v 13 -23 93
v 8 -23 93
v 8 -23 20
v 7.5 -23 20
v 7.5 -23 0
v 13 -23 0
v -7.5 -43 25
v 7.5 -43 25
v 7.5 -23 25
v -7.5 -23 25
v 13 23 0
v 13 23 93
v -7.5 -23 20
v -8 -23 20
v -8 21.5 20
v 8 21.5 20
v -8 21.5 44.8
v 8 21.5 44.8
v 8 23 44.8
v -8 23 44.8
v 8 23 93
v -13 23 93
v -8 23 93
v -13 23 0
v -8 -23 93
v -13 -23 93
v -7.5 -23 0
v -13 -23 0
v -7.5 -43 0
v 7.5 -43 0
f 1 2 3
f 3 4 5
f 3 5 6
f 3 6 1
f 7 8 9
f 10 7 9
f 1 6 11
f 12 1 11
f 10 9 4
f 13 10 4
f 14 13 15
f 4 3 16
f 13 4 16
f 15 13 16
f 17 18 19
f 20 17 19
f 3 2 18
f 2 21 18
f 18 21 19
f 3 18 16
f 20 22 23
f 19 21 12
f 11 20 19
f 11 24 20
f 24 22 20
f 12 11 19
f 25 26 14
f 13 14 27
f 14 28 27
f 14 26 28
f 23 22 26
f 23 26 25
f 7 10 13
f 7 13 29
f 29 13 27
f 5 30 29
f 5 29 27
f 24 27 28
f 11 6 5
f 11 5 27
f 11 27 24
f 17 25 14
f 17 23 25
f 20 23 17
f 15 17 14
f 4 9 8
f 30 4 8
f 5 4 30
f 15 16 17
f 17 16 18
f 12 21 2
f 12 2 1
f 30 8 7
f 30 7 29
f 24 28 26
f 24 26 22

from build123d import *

# Parameters (mm, degrees)
SKETCH_2_W          = 26
SKETCH_2_H          = 46
EXTRUDE_1_DEPTH     = 93
CUT_EXTRUDE_1_DEPTH = 8
SKETCH_7_W          = 25
SKETCH_7_H          = 20
EXTRUDE_2_DEPTH     = 7.5


with BuildPart() as part:
    # 스케치2 → 보스-돌출1 (new body)
    with BuildSketch(Plane.XY):
        Rectangle(SKETCH_2_W, SKETCH_2_H)
    extrude(amount=EXTRUDE_1_DEPTH)

    # 스케치3 → 컷-돌출1 (cut, symmetric)
    with BuildSketch(Plane(origin=(0, 0, 0), x_dir=(0, 0, -1), z_dir=(1, 0, 0))):
        Polygon((-93, -23), (-20, -23), (-20, 21.5), (-44.8, 21.5), (-44.8, 23), (-93, 23), align=None)
    extrude(amount=CUT_EXTRUDE_1_DEPTH, both=True, mode=Mode.SUBTRACT)

    # 스케치7 → 보스-돌출2 (add, symmetric)
    with BuildSketch(Plane(origin=(0, 0, 0), x_dir=(0, 0, -1), z_dir=(1, 0, 0))):
        with Locations((-12.5, -33)):
            Rectangle(SKETCH_7_W, SKETCH_7_H)
    extrude(amount=EXTRUDE_2_DEPTH, both=True)


solid = part.part
